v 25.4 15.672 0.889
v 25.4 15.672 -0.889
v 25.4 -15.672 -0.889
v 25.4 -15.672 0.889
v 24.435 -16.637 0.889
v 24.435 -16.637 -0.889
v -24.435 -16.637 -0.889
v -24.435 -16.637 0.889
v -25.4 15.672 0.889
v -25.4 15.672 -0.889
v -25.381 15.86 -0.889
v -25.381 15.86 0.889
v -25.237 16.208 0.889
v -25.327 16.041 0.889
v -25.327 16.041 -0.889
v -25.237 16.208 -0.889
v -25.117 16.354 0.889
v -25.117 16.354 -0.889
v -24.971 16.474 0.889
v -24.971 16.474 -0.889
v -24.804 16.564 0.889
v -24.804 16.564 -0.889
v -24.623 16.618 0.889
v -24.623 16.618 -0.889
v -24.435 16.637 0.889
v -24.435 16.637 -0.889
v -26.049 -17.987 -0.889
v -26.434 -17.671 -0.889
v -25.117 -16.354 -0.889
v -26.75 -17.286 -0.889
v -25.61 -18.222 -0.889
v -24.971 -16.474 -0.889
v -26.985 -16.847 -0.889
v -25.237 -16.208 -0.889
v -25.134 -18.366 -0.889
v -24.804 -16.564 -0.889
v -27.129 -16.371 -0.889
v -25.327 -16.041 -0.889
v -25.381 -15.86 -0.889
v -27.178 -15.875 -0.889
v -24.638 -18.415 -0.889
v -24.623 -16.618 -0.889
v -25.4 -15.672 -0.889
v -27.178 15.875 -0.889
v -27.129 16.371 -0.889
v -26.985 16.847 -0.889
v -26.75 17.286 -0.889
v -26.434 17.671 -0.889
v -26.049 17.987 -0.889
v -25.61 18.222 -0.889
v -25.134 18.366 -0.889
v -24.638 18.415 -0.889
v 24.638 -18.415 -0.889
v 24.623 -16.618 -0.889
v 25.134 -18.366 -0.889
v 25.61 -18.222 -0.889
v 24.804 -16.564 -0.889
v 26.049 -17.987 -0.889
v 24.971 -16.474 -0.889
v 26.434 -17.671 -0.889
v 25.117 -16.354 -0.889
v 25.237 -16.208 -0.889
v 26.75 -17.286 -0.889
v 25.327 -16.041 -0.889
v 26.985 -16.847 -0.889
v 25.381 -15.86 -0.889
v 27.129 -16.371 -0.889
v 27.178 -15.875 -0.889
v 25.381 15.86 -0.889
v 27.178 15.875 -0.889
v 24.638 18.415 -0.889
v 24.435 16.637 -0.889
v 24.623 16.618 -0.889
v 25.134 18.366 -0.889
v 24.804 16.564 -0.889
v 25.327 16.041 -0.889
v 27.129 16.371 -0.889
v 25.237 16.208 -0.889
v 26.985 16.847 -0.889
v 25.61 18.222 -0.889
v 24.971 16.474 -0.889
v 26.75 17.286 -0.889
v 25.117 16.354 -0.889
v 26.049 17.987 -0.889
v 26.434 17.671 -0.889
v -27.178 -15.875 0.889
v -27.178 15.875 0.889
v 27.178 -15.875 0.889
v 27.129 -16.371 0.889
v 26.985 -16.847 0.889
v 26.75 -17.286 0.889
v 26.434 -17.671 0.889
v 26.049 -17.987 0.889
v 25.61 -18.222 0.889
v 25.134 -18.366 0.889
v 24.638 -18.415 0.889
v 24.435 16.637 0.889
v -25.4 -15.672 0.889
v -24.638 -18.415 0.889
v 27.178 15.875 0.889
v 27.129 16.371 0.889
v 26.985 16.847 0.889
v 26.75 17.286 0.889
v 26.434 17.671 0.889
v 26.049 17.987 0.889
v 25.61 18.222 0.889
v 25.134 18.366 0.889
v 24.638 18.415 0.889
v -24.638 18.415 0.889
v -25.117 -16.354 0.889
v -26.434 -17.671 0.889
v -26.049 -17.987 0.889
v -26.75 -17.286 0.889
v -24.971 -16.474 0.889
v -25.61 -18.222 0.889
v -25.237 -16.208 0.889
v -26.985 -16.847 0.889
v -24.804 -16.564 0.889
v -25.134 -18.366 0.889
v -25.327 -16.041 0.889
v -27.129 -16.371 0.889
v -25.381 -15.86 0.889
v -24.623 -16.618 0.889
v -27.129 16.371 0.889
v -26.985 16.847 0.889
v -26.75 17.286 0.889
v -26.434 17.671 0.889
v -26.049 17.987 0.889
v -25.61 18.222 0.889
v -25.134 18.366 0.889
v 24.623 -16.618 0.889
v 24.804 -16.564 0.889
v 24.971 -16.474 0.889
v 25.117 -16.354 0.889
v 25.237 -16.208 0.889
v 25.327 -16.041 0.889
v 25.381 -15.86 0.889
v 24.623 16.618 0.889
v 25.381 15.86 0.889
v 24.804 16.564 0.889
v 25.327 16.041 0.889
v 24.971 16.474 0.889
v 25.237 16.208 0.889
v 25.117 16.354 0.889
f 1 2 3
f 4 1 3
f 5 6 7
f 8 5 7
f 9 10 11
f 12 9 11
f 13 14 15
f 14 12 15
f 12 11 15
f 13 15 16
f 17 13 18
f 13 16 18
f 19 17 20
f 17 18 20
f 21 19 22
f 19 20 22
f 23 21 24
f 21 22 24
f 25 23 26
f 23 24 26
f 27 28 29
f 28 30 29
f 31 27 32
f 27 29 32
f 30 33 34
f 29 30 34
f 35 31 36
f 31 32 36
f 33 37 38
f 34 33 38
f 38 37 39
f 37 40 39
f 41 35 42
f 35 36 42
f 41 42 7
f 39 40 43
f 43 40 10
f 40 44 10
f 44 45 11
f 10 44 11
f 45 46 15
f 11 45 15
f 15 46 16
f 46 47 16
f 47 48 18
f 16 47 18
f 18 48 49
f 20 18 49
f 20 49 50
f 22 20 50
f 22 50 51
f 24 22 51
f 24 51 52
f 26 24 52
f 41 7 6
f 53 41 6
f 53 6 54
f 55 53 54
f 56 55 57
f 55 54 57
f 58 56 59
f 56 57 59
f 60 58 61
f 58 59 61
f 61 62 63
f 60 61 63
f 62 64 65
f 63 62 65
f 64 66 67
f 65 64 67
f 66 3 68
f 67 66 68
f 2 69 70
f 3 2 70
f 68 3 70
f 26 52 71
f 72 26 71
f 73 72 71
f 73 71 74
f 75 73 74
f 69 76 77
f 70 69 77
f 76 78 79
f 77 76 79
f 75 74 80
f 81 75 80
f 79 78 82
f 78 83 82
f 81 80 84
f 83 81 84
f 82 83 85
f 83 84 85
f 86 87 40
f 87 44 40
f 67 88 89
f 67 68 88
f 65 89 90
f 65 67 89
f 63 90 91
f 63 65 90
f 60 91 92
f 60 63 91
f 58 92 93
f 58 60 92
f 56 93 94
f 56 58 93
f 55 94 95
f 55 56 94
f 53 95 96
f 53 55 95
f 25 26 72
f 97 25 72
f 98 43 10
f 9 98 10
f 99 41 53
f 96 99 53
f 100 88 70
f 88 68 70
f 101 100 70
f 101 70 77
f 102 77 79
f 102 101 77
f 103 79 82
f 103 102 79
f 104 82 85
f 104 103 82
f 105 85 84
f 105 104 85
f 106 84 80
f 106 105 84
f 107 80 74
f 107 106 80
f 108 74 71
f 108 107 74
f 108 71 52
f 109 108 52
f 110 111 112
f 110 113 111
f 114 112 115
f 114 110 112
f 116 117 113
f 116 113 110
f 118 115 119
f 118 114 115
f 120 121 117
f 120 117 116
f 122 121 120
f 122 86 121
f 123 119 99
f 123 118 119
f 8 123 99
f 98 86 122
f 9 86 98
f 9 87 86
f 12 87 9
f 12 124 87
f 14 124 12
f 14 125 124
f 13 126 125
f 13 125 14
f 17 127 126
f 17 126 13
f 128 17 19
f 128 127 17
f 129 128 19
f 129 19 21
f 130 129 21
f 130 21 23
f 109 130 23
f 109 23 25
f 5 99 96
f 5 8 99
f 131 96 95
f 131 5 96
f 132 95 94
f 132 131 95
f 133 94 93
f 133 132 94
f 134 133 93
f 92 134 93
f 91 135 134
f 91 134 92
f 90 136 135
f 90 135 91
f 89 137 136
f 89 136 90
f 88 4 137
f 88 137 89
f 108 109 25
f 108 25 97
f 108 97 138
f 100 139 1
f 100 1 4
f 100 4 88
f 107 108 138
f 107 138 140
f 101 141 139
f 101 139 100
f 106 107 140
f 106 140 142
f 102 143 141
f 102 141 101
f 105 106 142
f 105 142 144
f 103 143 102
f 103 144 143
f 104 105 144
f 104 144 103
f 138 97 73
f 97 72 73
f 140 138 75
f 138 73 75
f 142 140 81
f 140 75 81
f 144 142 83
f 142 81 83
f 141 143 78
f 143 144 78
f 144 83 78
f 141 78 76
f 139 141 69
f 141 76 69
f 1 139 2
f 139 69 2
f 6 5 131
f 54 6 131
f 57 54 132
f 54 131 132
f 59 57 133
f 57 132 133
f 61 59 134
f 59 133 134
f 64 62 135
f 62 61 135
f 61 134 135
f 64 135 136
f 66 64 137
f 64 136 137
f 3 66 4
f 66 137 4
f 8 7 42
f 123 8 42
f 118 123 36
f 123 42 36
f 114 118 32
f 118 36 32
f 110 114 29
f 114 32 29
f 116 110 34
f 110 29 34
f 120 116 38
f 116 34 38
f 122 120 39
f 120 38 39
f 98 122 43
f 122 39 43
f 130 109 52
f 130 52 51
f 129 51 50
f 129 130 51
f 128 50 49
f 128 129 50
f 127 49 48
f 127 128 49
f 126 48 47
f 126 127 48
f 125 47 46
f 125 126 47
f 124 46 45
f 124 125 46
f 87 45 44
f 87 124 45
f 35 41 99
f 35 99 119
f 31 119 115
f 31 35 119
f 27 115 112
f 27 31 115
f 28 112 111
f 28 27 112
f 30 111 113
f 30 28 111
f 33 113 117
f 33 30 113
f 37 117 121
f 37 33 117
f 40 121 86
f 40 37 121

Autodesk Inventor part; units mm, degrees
ref_plane "YZ Plane" through (0, 0, 0) normal (1, 0, 0) x (0, 1, 0)
ref_plane "XZ Plane" through (0, 0, 0) normal (0, 1, 0) x (-1, 0, 0)
ref_plane "XY Plane" through (0, 0, 0) normal (0, 0, 1) x (1, 0, 0)
sketch "Sketch1" plane through (0, 0, 0) normal (0, 0, 1) x (1, 0, 0)
  line L0 (25.4, -16.637) -> (-25.4, -16.637)
  line L1 (-25.4, -16.637) -> (-25.4, 16.637)
  line L2 (-25.4, 16.637) -> (25.4, 16.637)
  line L3 (25.4, 16.637) -> (25.4, -16.637)
  line L4 (25.4, -16.637) -> (-25.4, 16.637) construction
  line L5 (-25.4, -16.637) -> (25.4, 16.637) construction
  line L6 (27.178, 18.415) -> (-27.178, 18.415)
  line L7 (-27.178, 18.415) -> (-27.178, -18.415)
  line L8 (-27.178, -18.415) -> (27.178, -18.415)
  line L9 (27.178, -18.415) -> (27.178, 18.415)
  point P0 (0, 0)
  dimension "d0" = 50.8
  dimension "d1" = 33.274
  dimension "d2" = 1.778
extrude "Extrusion1" add sketch "Sketch1" along normal mid plane 1.778
fillet "Fillet1" radius 0.9652 4 edges at (25.4, 16.637, 0) (25.4, -16.637, 0) (-25.4, -16.637, 0) (-25.4, 16.637, 0)
fillet "Fillet1" radius 2.54 4 edges at (27.178, -18.415, 0) (27.178, 18.415, 0) (-27.178, 18.415, 0) (-27.178, -18.415, 0)
properties part number "O-Ring Dash 034 Square"
